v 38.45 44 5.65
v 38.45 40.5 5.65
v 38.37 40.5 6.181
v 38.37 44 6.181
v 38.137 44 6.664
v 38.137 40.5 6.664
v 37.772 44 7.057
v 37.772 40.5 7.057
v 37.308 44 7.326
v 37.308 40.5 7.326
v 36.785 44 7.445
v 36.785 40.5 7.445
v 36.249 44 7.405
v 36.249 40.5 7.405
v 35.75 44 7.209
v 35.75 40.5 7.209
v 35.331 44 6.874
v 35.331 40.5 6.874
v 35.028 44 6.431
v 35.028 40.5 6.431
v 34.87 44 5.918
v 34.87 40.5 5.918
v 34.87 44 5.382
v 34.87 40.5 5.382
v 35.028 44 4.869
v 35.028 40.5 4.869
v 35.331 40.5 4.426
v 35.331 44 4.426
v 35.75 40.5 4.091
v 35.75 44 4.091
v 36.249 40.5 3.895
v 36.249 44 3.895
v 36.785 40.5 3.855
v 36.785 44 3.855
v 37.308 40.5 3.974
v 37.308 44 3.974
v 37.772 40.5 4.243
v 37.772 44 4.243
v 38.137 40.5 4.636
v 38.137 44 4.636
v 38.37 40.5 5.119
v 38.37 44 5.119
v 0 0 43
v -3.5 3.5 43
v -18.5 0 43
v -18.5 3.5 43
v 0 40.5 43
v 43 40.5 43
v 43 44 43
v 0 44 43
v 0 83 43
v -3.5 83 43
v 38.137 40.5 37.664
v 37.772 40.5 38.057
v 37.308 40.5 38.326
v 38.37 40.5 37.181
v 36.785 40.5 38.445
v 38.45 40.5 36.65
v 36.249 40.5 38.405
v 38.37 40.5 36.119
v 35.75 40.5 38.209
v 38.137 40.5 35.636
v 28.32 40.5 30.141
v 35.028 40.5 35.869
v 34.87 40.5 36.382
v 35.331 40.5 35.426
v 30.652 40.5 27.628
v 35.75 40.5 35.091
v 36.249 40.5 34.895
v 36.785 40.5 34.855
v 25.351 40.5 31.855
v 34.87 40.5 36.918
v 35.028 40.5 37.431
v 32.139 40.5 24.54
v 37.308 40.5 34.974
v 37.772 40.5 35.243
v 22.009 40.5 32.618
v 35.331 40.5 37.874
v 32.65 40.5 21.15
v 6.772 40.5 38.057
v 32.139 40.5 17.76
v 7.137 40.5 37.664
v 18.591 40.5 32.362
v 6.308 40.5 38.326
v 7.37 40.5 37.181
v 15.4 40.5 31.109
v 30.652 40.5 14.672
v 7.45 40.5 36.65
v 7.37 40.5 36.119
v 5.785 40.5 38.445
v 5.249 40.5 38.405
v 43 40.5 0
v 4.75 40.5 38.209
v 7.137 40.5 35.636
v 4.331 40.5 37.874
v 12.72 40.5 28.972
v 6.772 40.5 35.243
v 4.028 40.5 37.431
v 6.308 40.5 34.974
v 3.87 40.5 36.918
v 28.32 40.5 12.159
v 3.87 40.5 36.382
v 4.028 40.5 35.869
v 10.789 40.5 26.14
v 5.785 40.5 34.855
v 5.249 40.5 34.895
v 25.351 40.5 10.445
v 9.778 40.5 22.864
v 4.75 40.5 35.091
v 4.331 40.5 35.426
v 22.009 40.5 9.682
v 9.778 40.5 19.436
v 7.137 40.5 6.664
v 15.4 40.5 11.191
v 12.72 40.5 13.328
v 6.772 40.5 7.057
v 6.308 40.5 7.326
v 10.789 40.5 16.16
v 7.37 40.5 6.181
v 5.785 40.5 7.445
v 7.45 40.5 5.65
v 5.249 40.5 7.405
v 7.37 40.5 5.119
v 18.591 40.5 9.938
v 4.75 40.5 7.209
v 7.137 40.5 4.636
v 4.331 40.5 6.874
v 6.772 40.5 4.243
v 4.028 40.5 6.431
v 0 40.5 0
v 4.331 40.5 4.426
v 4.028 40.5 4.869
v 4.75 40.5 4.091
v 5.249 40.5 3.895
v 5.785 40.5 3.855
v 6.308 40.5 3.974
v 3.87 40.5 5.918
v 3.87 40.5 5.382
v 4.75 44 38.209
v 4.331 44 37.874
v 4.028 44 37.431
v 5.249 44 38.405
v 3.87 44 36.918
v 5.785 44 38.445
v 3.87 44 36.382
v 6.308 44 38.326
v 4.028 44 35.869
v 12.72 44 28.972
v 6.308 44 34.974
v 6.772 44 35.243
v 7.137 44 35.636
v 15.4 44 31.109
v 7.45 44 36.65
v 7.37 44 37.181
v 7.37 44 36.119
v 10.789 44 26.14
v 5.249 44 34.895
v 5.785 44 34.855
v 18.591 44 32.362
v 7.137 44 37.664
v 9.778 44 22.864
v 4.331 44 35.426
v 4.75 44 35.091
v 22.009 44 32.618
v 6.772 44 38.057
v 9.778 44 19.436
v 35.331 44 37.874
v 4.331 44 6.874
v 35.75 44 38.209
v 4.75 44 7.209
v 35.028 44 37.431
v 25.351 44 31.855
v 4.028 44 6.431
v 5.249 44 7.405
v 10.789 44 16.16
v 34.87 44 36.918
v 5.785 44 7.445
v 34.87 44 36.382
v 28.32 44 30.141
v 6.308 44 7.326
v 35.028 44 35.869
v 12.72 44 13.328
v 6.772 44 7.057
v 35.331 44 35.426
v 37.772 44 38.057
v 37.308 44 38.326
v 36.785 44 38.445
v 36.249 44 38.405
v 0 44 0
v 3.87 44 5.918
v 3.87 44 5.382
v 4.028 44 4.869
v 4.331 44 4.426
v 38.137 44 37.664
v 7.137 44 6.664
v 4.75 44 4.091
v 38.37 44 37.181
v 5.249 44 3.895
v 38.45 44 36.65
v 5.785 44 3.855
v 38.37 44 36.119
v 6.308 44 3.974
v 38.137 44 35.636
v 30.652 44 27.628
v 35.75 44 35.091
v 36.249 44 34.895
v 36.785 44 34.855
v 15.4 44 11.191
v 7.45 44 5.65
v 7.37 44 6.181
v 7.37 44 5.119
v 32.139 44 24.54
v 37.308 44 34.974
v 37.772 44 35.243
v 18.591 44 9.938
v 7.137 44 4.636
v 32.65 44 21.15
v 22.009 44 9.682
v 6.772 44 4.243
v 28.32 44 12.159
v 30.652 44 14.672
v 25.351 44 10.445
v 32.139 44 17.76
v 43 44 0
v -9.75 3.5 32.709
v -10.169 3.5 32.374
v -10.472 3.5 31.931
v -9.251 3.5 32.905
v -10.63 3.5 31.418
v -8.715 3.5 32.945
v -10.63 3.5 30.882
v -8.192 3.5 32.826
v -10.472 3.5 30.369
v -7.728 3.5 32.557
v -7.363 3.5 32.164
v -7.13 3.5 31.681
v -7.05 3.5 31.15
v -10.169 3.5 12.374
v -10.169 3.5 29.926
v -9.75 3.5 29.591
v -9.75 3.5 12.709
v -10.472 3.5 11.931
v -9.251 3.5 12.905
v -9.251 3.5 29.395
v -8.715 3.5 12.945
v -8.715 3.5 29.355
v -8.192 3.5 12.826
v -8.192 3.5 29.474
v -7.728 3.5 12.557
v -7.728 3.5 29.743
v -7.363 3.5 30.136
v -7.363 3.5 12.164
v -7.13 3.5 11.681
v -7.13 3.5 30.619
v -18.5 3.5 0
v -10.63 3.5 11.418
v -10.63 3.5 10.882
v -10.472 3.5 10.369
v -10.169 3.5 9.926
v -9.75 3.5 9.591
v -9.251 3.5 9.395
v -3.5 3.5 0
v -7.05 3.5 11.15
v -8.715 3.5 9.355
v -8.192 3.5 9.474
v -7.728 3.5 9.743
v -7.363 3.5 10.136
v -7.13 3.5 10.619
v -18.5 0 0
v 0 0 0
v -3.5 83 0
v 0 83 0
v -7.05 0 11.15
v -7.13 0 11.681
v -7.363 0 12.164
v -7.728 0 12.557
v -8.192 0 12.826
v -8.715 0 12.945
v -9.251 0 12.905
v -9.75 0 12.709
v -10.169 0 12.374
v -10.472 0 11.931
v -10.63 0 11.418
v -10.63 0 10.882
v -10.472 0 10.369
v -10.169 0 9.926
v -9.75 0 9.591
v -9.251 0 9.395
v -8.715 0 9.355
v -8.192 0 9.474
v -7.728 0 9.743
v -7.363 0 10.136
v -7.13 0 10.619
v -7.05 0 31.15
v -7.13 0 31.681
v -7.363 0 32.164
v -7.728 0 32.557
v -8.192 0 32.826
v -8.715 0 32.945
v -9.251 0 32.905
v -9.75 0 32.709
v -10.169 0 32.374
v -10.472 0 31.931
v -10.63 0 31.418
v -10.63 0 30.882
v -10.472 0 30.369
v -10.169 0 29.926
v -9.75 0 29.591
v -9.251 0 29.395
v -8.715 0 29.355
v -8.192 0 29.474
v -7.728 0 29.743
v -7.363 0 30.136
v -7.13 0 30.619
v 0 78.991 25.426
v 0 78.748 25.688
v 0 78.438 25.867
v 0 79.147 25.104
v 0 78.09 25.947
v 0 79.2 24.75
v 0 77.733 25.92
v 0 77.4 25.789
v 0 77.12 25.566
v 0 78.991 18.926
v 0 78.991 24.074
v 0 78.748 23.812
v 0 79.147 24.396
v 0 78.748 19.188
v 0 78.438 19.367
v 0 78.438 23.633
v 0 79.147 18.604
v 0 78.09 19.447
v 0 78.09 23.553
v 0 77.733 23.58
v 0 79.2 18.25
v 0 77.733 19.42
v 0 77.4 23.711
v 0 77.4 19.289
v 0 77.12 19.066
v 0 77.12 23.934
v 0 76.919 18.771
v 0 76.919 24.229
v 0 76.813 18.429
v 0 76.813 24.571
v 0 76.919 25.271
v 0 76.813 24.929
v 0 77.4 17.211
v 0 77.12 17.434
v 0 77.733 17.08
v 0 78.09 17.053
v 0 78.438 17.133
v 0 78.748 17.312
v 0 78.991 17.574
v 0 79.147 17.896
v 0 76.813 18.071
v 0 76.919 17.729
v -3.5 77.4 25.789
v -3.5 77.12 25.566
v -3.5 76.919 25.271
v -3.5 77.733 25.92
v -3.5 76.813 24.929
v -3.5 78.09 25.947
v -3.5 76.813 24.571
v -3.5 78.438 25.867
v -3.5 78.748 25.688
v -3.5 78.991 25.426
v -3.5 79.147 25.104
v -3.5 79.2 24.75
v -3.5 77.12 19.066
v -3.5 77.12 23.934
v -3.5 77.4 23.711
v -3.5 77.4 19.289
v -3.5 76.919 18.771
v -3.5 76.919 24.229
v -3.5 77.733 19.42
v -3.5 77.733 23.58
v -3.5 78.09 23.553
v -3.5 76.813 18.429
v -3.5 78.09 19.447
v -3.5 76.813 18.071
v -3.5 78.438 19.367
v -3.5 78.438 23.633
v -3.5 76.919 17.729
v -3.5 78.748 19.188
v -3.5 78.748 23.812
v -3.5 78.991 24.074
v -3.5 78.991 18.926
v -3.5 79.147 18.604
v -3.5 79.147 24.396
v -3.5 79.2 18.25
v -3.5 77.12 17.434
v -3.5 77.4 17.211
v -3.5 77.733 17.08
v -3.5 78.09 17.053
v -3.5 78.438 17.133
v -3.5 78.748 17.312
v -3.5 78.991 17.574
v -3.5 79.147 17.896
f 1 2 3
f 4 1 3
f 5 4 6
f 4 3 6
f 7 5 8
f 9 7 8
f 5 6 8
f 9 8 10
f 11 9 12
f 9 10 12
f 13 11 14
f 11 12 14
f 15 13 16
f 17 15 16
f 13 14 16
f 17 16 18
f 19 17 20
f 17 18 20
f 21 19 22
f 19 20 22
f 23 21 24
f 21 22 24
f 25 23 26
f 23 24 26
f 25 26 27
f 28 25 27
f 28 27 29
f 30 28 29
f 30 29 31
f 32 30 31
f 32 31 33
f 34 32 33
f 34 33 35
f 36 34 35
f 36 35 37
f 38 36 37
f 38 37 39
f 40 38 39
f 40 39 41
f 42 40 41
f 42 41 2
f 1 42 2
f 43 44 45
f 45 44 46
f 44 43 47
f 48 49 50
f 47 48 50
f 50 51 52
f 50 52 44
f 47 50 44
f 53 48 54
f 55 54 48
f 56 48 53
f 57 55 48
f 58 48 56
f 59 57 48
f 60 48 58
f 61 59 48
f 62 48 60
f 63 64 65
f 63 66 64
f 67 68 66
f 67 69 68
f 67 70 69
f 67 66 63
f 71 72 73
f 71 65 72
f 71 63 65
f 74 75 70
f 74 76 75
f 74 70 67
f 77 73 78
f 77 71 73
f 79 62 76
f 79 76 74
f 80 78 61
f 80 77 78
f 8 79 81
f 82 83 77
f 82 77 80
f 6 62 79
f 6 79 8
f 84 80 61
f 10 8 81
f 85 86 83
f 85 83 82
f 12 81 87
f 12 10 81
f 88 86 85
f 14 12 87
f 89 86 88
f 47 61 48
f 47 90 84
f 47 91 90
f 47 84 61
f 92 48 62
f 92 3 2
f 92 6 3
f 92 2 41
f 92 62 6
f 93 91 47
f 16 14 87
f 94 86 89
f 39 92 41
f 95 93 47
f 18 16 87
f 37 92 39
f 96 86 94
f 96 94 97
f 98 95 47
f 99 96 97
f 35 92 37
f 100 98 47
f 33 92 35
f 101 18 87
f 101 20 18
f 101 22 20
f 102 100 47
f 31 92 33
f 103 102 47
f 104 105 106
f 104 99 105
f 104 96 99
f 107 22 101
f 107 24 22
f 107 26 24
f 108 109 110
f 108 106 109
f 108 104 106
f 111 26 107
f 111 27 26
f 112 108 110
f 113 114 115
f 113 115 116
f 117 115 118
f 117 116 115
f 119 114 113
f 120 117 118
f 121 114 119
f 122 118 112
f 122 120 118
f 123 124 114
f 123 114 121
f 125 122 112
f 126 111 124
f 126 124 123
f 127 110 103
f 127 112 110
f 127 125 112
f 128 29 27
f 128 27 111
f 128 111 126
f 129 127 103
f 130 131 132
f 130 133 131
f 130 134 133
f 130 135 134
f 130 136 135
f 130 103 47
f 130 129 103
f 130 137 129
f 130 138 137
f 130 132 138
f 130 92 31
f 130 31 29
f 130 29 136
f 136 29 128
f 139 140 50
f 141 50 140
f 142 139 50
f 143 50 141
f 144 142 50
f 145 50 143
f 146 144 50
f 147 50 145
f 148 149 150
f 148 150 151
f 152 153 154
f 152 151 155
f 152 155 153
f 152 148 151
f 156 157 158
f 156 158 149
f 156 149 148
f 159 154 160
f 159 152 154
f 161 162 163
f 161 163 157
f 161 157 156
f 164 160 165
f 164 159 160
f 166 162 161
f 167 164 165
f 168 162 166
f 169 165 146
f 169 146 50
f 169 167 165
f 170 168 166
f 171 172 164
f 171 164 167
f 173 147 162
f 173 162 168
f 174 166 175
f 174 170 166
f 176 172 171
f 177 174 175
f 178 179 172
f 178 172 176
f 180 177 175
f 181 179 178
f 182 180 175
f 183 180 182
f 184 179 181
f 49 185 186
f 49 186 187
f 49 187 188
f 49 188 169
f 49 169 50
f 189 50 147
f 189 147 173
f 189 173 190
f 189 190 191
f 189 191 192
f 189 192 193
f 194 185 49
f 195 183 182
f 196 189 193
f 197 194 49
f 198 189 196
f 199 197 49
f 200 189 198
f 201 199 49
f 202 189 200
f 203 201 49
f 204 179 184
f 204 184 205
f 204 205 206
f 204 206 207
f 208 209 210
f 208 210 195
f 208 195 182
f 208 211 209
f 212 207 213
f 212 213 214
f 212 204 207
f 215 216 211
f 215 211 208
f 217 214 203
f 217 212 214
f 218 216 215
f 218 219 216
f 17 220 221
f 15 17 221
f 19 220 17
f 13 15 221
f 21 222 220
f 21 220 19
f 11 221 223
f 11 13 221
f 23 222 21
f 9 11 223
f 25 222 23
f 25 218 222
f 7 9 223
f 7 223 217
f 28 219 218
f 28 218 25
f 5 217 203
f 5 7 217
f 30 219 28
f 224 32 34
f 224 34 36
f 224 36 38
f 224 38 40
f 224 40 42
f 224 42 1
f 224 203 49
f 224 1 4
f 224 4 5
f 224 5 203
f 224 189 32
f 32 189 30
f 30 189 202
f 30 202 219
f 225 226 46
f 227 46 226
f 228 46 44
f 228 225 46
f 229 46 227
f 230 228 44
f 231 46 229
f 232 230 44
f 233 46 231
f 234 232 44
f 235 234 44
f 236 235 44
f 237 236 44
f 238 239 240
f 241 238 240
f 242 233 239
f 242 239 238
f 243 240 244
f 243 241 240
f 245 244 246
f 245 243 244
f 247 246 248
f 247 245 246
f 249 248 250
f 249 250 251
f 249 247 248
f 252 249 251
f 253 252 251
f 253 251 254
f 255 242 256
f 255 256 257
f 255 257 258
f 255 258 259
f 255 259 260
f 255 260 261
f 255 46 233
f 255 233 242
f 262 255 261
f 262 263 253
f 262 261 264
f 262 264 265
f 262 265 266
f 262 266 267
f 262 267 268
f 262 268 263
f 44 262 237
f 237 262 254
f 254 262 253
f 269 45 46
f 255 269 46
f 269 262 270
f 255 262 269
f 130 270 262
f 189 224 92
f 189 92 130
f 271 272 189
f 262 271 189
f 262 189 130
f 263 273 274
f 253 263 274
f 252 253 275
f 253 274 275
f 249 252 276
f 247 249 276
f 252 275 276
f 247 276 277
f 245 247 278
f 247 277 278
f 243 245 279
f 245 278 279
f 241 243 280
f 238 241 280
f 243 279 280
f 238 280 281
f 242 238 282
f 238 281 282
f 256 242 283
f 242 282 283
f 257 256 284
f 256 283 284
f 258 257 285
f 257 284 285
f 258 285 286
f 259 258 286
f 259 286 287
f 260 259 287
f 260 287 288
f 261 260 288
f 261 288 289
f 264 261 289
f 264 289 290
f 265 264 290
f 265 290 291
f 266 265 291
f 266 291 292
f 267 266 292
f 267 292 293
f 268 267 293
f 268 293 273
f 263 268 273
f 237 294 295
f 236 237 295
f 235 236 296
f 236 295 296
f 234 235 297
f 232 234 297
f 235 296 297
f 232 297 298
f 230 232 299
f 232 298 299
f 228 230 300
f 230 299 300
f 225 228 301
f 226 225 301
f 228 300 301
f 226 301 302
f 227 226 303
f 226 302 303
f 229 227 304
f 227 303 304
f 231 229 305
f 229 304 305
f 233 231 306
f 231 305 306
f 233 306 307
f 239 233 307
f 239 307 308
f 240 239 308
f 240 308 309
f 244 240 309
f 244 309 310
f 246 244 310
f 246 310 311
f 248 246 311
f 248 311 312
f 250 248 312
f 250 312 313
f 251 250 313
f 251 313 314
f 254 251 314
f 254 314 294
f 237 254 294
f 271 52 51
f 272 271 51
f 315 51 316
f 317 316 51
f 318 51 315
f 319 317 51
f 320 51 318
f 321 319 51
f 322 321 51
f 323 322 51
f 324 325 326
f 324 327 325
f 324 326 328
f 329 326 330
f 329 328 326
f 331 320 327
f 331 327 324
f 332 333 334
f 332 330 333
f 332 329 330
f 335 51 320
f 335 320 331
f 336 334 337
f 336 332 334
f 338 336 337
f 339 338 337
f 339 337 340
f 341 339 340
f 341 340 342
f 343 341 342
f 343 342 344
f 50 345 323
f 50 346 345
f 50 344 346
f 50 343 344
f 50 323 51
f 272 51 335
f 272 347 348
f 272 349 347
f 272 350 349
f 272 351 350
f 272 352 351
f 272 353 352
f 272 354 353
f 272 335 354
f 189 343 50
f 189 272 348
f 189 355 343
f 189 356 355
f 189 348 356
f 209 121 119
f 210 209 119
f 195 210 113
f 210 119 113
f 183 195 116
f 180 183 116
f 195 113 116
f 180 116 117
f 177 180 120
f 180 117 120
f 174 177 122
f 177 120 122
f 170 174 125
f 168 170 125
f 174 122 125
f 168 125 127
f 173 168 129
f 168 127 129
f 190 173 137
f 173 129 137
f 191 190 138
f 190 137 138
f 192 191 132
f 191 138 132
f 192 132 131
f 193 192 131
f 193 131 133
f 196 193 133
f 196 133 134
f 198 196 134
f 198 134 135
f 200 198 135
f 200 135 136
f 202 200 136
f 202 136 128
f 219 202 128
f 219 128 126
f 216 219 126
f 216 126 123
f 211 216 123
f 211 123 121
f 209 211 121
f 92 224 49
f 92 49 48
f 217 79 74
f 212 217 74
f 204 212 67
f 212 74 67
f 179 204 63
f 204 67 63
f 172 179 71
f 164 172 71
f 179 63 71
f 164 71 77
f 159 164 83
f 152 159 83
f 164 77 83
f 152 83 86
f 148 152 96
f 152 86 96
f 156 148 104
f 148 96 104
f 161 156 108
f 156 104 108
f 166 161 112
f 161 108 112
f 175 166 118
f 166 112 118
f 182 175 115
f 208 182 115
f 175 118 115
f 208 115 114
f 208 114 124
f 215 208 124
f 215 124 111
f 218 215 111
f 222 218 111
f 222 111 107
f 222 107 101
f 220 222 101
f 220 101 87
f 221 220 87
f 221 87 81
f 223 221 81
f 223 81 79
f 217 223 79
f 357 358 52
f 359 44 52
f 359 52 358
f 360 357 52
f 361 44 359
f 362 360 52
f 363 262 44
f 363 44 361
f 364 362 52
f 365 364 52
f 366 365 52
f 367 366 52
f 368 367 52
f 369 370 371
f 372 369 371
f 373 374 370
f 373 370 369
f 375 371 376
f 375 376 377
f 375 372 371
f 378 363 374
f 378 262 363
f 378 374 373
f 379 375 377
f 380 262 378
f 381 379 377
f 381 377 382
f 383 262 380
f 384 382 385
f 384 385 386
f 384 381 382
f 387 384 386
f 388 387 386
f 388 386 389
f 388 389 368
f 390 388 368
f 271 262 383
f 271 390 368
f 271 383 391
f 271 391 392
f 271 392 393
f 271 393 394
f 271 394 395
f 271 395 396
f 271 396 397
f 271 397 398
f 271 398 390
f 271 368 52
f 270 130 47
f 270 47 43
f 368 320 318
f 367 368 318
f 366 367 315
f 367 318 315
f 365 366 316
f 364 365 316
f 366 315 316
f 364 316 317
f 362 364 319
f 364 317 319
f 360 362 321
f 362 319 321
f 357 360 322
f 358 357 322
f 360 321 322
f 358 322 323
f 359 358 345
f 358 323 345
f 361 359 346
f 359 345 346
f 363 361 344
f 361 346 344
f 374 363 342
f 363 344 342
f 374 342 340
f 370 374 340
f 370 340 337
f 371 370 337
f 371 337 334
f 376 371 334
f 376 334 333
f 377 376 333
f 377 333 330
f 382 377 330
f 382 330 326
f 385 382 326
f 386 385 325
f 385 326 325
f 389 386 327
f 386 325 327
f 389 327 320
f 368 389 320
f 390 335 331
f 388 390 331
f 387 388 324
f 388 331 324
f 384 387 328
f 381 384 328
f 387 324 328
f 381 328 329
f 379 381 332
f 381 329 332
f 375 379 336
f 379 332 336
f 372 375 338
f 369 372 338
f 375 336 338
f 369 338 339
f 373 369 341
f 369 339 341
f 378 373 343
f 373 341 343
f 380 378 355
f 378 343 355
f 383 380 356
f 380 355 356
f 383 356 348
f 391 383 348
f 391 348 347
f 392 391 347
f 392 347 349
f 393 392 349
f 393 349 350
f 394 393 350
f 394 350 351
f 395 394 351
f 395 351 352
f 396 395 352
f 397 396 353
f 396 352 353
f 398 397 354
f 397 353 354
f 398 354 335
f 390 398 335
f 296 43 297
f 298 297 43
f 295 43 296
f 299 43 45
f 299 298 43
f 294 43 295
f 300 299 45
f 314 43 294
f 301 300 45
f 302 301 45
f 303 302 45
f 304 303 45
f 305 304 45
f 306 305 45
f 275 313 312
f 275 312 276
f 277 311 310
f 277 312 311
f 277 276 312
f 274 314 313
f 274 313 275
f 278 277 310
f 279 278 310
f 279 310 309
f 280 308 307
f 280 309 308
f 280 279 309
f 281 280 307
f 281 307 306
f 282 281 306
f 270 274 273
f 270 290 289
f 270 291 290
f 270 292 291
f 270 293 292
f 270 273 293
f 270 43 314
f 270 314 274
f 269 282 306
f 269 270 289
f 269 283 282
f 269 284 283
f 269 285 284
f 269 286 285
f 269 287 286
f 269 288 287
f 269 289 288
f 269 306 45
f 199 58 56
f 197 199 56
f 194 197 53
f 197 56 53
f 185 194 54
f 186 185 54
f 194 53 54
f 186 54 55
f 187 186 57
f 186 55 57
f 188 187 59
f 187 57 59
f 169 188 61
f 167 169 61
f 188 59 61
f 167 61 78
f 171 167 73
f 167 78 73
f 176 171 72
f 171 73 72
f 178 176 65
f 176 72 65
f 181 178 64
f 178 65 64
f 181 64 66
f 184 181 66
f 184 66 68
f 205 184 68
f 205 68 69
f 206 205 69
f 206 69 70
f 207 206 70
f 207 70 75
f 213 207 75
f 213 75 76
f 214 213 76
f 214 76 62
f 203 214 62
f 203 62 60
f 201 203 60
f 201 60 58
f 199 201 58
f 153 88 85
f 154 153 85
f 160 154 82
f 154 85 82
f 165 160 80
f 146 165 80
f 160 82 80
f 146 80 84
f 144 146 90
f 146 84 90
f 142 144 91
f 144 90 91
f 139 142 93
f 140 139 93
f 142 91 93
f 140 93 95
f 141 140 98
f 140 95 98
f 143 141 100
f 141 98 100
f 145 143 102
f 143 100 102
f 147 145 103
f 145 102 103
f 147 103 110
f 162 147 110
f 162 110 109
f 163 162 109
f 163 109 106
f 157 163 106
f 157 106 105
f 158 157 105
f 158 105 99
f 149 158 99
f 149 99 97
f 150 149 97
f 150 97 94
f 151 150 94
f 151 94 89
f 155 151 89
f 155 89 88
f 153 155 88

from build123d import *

# Parameters (mm, degrees)
PAD_DEPTH       = 43
SKETCH001_R     = 11.5
SKETCH001_R_2   = 1.8
POCKET_DEPTH    = 83.001
SKETCH002_R     = 1.2
POCKET001_DEPTH = 3.5


with BuildPart() as part:
    # Sketch → Pad (new body)
    with BuildSketch(Plane.XY):
        Polygon((-18.5, 3.5), (-3.5, 3.5), (-3.5, 83), (0, 83), (0, 44), (43, 44), (43, 40.5), (0, 40.5), (0, 0), (-18.5, 0), align=None)
    extrude(amount=PAD_DEPTH)

    # Sketch001 → Pocket (cut, through all)
    with BuildSketch(Plane.XZ):
        with Locations((21.15, 21.15)):
            Circle(SKETCH001_R)
        with Locations((5.65, 36.65)):
            Circle(SKETCH001_R_2)
        with Locations((36.65, 36.65)):
            Circle(SKETCH001_R_2)
        with Locations((36.65, 5.65)):
            Circle(SKETCH001_R_2)
        with Locations((5.65, 5.65)):
            Circle(SKETCH001_R_2)
        with Locations((-8.85, 31.15)):
            Circle(SKETCH001_R_2)
        with Locations((-8.85, 11.15)):
            Circle(SKETCH001_R_2)
    extrude(amount=-POCKET_DEPTH, mode=Mode.SUBTRACT)

    # Sketch002 → Pocket001 (cut)
    with BuildSketch(Plane.YZ):
        with Locations((78, 24.75)):
            Circle(SKETCH002_R)
        with Locations((78, 18.25)):
            Circle(SKETCH002_R)
    extrude(amount=-POCKET001_DEPTH, mode=Mode.SUBTRACT)


solid = part.part
